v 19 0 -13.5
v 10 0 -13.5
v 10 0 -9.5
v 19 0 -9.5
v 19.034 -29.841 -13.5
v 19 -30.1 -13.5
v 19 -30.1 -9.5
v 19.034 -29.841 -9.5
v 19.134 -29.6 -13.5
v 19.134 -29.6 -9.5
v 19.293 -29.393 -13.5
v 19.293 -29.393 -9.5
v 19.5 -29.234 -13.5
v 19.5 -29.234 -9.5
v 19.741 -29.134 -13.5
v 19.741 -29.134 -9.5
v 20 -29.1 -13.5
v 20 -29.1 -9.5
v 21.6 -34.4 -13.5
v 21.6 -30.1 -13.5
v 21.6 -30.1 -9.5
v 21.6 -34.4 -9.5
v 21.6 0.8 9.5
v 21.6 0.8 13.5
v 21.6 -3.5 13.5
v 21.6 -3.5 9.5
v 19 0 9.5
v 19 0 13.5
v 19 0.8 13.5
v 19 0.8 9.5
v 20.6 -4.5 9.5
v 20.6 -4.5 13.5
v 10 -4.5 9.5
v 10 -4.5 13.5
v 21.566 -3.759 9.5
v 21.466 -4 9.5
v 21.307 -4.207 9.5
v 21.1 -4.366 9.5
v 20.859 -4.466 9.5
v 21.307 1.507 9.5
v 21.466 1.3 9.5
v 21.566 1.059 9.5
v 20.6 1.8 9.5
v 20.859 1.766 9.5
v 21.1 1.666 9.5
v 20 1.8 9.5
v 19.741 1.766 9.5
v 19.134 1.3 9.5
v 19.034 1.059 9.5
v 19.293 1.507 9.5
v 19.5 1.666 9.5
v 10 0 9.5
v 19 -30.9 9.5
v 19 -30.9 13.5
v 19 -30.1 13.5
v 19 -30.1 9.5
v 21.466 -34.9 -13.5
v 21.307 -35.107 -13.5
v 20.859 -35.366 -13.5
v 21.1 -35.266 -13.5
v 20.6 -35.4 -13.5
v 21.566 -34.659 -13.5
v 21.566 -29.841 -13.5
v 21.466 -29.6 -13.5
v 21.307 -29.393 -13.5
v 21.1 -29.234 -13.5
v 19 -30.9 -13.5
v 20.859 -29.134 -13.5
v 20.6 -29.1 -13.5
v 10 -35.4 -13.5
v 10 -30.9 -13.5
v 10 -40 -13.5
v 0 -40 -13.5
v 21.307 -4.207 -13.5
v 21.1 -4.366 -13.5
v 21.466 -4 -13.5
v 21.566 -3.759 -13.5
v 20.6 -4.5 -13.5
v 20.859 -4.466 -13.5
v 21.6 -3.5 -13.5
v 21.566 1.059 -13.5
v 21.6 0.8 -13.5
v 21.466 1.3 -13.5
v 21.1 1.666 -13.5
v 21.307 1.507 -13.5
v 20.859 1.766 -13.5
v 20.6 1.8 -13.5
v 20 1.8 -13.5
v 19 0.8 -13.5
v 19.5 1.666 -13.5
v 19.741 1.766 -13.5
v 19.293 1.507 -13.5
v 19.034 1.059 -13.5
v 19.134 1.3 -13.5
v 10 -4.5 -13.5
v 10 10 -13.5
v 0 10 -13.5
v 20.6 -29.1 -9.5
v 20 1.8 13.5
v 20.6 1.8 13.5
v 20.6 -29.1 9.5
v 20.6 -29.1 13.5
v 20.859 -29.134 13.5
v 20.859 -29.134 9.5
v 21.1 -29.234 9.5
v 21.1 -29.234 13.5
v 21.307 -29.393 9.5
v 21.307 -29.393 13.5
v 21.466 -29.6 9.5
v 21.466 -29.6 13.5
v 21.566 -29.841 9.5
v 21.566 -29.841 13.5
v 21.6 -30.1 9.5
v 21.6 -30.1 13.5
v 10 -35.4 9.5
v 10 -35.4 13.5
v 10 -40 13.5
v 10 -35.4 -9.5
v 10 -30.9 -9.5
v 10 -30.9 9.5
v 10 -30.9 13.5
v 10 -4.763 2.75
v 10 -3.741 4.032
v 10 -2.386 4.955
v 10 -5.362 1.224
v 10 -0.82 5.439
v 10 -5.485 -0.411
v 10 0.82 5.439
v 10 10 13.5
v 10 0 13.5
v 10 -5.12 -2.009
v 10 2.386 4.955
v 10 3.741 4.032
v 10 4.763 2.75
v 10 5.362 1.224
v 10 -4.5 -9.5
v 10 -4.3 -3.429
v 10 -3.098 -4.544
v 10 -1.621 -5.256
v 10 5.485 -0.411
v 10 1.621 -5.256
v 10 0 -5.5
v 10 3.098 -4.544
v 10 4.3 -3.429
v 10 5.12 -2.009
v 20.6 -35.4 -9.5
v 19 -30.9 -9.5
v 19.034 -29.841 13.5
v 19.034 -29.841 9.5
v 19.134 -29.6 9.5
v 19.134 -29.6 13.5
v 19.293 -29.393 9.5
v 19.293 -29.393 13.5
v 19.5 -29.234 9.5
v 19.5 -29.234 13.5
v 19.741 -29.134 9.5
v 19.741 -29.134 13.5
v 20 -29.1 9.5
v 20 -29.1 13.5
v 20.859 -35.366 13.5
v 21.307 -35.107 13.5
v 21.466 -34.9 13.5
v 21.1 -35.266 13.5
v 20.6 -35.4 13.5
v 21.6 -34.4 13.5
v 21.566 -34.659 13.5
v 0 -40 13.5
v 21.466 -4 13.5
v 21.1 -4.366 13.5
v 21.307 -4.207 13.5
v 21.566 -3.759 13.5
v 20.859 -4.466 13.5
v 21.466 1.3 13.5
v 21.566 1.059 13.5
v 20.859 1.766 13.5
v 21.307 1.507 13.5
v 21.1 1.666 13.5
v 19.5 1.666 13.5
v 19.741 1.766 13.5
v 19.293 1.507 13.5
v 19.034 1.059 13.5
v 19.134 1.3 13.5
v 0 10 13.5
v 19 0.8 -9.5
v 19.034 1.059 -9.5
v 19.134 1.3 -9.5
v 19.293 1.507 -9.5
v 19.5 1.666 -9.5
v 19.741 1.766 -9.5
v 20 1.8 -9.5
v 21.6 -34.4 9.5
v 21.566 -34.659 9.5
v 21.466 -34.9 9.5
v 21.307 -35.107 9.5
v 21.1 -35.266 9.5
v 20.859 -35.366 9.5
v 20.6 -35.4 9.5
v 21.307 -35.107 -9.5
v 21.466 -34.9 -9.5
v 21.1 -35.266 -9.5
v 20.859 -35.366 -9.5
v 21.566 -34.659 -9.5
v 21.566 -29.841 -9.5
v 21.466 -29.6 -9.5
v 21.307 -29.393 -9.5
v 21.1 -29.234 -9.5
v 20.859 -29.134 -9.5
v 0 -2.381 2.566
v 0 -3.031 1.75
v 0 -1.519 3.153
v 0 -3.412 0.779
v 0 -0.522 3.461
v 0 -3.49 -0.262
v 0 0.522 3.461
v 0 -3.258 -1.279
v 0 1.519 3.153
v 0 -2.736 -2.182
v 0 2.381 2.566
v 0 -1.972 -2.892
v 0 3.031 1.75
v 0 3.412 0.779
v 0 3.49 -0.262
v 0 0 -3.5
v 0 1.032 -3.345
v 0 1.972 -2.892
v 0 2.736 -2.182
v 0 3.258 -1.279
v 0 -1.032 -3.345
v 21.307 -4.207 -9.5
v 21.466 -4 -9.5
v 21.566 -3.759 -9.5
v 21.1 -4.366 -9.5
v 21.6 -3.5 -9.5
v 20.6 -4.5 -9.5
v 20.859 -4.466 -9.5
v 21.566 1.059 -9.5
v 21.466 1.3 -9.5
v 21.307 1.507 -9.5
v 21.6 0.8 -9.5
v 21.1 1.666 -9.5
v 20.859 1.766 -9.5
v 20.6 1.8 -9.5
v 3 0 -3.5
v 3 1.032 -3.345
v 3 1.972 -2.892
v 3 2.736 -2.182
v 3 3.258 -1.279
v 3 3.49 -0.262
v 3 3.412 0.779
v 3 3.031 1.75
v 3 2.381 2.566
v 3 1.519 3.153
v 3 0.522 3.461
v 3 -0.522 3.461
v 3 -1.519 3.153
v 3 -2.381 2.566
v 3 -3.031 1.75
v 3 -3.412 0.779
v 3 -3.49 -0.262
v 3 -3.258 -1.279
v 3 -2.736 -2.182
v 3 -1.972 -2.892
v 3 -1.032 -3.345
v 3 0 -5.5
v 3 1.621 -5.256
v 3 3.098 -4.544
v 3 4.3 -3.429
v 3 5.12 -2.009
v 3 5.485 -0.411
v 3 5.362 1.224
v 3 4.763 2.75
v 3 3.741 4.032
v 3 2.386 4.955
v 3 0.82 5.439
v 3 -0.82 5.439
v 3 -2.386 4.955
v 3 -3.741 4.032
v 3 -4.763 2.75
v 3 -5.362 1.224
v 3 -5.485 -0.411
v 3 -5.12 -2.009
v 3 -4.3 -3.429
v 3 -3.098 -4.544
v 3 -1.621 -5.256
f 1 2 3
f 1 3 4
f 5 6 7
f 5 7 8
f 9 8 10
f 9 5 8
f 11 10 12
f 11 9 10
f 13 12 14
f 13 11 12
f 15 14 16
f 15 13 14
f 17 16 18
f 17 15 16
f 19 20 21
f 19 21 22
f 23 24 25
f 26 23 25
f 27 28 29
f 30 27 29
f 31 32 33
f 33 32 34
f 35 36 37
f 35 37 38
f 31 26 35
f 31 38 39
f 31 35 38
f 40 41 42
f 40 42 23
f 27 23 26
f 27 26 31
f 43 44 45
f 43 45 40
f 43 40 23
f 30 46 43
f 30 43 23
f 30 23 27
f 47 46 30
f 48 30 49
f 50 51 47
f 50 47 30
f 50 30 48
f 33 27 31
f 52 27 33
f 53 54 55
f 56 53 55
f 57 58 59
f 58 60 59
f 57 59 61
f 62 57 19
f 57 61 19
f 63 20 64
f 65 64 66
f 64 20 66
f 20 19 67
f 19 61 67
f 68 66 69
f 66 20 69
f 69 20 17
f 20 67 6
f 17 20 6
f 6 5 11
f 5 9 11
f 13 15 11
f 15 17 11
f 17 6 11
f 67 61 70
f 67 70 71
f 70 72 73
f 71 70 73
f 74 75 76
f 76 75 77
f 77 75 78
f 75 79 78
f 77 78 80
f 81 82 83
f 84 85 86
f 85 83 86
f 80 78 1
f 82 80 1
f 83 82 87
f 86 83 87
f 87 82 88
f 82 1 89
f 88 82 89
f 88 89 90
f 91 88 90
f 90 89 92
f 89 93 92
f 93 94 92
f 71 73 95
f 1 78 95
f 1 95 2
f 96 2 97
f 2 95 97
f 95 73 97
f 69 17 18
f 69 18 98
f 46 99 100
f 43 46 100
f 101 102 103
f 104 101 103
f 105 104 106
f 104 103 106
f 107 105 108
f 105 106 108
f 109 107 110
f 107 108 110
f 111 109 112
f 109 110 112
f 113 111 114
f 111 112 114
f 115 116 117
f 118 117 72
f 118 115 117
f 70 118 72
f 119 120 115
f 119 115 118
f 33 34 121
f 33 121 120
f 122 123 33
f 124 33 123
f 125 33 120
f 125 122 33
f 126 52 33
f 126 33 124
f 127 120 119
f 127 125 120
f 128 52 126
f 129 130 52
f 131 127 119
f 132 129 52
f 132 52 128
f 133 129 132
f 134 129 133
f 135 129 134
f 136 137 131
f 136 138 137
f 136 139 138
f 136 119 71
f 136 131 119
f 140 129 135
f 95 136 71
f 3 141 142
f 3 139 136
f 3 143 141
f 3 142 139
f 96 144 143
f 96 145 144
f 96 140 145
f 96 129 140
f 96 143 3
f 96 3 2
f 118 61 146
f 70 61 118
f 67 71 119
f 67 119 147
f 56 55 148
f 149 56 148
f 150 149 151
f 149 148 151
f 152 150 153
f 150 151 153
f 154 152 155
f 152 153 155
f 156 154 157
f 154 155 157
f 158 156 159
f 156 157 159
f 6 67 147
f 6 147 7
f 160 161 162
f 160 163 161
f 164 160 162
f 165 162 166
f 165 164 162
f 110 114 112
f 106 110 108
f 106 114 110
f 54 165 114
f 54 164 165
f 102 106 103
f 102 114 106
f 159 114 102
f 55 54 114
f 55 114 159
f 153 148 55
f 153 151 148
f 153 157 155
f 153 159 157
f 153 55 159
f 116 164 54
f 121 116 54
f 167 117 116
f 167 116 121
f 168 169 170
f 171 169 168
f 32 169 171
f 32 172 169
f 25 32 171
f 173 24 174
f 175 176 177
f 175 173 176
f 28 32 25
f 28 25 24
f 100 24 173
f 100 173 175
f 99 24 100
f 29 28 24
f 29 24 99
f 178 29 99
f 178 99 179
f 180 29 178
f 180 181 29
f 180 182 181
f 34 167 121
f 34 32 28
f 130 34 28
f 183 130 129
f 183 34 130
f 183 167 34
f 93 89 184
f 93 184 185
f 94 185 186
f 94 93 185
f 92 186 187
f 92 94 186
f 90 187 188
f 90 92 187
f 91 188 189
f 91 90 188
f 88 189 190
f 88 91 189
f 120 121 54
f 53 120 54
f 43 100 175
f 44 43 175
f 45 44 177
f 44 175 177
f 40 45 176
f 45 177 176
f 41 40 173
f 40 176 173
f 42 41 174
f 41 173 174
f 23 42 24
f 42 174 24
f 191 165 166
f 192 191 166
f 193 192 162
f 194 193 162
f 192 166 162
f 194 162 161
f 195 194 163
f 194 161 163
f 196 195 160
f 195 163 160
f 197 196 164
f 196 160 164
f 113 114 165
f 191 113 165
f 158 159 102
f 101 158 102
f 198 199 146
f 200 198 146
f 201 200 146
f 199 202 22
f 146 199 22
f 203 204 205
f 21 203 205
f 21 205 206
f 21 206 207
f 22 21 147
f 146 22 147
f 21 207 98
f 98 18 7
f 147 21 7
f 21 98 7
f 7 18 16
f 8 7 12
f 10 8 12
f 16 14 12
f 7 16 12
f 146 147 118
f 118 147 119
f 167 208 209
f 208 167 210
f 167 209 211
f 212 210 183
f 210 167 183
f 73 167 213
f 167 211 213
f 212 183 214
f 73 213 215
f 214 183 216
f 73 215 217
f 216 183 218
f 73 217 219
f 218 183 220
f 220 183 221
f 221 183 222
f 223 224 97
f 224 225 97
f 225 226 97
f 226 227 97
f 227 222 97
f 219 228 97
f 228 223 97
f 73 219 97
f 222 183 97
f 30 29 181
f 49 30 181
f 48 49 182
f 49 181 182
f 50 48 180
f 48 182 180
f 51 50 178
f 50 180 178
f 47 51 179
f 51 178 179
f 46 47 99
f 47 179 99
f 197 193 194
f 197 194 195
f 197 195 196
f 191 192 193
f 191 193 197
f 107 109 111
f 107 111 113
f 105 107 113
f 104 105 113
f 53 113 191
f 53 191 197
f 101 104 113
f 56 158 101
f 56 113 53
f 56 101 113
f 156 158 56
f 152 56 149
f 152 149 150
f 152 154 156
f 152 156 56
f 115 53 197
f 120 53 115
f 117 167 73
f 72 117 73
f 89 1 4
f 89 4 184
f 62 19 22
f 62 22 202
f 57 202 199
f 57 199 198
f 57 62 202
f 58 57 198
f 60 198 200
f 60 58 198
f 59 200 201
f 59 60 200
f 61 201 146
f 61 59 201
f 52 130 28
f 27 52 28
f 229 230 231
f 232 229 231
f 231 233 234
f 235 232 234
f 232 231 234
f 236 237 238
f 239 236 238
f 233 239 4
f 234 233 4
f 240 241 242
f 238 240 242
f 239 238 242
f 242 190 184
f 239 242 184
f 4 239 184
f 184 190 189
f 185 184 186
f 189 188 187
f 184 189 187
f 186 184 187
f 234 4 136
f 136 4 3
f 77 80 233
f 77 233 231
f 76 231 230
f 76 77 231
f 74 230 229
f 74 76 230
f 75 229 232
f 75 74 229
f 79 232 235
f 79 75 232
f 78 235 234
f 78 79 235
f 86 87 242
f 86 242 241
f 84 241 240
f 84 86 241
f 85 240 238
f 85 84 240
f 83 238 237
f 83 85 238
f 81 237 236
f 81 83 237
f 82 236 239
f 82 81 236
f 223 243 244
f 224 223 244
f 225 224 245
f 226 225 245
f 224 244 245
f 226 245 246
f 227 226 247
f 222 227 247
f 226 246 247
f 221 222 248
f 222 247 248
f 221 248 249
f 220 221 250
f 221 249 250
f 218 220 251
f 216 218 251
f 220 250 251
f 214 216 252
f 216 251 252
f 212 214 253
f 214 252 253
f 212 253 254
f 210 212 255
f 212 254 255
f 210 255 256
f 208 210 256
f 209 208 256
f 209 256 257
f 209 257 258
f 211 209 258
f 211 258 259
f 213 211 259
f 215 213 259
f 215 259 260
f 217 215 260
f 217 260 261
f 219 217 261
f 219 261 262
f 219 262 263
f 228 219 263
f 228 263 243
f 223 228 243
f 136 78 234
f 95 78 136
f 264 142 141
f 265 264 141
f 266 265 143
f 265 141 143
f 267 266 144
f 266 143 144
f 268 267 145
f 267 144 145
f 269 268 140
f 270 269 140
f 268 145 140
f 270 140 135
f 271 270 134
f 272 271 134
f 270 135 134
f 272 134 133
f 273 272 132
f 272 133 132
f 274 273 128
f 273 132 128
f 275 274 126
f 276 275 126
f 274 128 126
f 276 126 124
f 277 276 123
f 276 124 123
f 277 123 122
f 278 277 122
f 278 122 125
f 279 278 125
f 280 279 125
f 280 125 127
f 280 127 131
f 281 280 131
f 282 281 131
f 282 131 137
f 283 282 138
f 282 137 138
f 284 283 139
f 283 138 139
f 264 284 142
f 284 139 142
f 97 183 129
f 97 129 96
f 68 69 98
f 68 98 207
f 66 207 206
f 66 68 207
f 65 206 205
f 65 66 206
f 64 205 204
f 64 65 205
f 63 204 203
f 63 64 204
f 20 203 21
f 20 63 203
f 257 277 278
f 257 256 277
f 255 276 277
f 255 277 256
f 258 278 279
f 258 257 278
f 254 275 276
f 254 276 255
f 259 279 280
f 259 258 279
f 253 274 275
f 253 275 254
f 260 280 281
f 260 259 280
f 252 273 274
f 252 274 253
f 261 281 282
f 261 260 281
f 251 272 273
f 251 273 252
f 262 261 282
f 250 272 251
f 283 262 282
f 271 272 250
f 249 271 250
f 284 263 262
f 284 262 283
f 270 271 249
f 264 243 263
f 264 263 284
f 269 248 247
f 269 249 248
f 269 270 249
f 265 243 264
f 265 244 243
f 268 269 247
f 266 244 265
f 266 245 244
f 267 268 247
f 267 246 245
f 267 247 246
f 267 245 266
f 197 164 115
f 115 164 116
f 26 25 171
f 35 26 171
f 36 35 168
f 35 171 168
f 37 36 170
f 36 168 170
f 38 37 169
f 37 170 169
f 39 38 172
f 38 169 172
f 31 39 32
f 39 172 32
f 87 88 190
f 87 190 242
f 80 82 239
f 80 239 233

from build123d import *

# Parameters (mm, degrees)
SKETCH1_W           = 27
SKETCH1_H           = 50
BOSS_EXTRUDE1_DEPTH = 10
SKETCH2_R           = 3.5
CUT_EXTRUDE1_DEPTH  = 10
SKETCH3_R           = 5.5
CUT_EXTRUDE2_DEPTH  = 7
BOSS_EXTRUDE2_DEPTH = 4


with BuildPart() as part:
    # Sketch1 → Boss-Extrude1 (new body)
    with BuildSketch(Plane(origin=(0, 0, 0), x_dir=(0, 0, -1), z_dir=(1, 0, 0))):
        with Locations((0, -15)):
            Rectangle(SKETCH1_W, SKETCH1_H)
    extrude(amount=BOSS_EXTRUDE1_DEPTH)

    # Sketch2 → Cut-Extrude1 (cut)
    with BuildSketch(Plane(origin=(10, 0, 0), x_dir=(0, 0, -1), z_dir=(1, 0, 0))):
        Circle(SKETCH2_R)
    extrude(amount=-CUT_EXTRUDE1_DEPTH, mode=Mode.SUBTRACT)

    # Sketch3 → Cut-Extrude2 (cut)
    with BuildSketch(Plane(origin=(10, 0, 0), x_dir=(0, 0, -1), z_dir=(1, 0, 0))):
        Circle(SKETCH3_R)
    extrude(amount=-CUT_EXTRUDE2_DEPTH, mode=Mode.SUBTRACT)

    # Sketch4 → Boss-Extrude2 (add)
    with BuildSketch(Plane.XY.offset(13.5)):
        with BuildLine():
            Line((10, 0), (19, 0))
            Line((19, 0), (19, 0.8))
            ThreePointArc((19, 0.8), (19.292893219, 1.507106781), (20, 1.8))
            Line((20, 1.8), (20.6, 1.8))
            ThreePointArc((20.6, 1.8), (21.307106781, 1.507106781), (21.6, 0.8))
            Line((21.6, 0.8), (21.6, -3.5))
            ThreePointArc((21.6, -3.5), (21.307106781, -4.207106781), (20.6, -4.5))
            Line((20.6, -4.5), (10, -4.5))
            Line((10, -4.5), (10, 0))
        make_face()
        with BuildLine():
            Line((10, -30.9), (19, -30.9))
            Line((19, -30.9), (19, -30.1))
            ThreePointArc((19, -30.1), (19.292893219, -29.392893219), (20, -29.1))
            Line((20, -29.1), (20.6, -29.1))
            ThreePointArc((20.6, -29.1), (21.307106781, -29.392893219), (21.6, -30.1))
            Line((21.6, -30.1), (21.6, -34.4))
            ThreePointArc((21.6, -34.4), (21.307106781, -35.107106781), (20.6, -35.4))
            Line((20.6, -35.4), (10, -35.4))
            Line((10, -35.4), (10, -30.9))
        make_face()
    boss_extrude2 = extrude(amount=-BOSS_EXTRUDE2_DEPTH)

    # Mirror1: Boss-Extrude2 across plane
    add(boss_extrude2.mirror(Plane.XY))


solid = part.part
